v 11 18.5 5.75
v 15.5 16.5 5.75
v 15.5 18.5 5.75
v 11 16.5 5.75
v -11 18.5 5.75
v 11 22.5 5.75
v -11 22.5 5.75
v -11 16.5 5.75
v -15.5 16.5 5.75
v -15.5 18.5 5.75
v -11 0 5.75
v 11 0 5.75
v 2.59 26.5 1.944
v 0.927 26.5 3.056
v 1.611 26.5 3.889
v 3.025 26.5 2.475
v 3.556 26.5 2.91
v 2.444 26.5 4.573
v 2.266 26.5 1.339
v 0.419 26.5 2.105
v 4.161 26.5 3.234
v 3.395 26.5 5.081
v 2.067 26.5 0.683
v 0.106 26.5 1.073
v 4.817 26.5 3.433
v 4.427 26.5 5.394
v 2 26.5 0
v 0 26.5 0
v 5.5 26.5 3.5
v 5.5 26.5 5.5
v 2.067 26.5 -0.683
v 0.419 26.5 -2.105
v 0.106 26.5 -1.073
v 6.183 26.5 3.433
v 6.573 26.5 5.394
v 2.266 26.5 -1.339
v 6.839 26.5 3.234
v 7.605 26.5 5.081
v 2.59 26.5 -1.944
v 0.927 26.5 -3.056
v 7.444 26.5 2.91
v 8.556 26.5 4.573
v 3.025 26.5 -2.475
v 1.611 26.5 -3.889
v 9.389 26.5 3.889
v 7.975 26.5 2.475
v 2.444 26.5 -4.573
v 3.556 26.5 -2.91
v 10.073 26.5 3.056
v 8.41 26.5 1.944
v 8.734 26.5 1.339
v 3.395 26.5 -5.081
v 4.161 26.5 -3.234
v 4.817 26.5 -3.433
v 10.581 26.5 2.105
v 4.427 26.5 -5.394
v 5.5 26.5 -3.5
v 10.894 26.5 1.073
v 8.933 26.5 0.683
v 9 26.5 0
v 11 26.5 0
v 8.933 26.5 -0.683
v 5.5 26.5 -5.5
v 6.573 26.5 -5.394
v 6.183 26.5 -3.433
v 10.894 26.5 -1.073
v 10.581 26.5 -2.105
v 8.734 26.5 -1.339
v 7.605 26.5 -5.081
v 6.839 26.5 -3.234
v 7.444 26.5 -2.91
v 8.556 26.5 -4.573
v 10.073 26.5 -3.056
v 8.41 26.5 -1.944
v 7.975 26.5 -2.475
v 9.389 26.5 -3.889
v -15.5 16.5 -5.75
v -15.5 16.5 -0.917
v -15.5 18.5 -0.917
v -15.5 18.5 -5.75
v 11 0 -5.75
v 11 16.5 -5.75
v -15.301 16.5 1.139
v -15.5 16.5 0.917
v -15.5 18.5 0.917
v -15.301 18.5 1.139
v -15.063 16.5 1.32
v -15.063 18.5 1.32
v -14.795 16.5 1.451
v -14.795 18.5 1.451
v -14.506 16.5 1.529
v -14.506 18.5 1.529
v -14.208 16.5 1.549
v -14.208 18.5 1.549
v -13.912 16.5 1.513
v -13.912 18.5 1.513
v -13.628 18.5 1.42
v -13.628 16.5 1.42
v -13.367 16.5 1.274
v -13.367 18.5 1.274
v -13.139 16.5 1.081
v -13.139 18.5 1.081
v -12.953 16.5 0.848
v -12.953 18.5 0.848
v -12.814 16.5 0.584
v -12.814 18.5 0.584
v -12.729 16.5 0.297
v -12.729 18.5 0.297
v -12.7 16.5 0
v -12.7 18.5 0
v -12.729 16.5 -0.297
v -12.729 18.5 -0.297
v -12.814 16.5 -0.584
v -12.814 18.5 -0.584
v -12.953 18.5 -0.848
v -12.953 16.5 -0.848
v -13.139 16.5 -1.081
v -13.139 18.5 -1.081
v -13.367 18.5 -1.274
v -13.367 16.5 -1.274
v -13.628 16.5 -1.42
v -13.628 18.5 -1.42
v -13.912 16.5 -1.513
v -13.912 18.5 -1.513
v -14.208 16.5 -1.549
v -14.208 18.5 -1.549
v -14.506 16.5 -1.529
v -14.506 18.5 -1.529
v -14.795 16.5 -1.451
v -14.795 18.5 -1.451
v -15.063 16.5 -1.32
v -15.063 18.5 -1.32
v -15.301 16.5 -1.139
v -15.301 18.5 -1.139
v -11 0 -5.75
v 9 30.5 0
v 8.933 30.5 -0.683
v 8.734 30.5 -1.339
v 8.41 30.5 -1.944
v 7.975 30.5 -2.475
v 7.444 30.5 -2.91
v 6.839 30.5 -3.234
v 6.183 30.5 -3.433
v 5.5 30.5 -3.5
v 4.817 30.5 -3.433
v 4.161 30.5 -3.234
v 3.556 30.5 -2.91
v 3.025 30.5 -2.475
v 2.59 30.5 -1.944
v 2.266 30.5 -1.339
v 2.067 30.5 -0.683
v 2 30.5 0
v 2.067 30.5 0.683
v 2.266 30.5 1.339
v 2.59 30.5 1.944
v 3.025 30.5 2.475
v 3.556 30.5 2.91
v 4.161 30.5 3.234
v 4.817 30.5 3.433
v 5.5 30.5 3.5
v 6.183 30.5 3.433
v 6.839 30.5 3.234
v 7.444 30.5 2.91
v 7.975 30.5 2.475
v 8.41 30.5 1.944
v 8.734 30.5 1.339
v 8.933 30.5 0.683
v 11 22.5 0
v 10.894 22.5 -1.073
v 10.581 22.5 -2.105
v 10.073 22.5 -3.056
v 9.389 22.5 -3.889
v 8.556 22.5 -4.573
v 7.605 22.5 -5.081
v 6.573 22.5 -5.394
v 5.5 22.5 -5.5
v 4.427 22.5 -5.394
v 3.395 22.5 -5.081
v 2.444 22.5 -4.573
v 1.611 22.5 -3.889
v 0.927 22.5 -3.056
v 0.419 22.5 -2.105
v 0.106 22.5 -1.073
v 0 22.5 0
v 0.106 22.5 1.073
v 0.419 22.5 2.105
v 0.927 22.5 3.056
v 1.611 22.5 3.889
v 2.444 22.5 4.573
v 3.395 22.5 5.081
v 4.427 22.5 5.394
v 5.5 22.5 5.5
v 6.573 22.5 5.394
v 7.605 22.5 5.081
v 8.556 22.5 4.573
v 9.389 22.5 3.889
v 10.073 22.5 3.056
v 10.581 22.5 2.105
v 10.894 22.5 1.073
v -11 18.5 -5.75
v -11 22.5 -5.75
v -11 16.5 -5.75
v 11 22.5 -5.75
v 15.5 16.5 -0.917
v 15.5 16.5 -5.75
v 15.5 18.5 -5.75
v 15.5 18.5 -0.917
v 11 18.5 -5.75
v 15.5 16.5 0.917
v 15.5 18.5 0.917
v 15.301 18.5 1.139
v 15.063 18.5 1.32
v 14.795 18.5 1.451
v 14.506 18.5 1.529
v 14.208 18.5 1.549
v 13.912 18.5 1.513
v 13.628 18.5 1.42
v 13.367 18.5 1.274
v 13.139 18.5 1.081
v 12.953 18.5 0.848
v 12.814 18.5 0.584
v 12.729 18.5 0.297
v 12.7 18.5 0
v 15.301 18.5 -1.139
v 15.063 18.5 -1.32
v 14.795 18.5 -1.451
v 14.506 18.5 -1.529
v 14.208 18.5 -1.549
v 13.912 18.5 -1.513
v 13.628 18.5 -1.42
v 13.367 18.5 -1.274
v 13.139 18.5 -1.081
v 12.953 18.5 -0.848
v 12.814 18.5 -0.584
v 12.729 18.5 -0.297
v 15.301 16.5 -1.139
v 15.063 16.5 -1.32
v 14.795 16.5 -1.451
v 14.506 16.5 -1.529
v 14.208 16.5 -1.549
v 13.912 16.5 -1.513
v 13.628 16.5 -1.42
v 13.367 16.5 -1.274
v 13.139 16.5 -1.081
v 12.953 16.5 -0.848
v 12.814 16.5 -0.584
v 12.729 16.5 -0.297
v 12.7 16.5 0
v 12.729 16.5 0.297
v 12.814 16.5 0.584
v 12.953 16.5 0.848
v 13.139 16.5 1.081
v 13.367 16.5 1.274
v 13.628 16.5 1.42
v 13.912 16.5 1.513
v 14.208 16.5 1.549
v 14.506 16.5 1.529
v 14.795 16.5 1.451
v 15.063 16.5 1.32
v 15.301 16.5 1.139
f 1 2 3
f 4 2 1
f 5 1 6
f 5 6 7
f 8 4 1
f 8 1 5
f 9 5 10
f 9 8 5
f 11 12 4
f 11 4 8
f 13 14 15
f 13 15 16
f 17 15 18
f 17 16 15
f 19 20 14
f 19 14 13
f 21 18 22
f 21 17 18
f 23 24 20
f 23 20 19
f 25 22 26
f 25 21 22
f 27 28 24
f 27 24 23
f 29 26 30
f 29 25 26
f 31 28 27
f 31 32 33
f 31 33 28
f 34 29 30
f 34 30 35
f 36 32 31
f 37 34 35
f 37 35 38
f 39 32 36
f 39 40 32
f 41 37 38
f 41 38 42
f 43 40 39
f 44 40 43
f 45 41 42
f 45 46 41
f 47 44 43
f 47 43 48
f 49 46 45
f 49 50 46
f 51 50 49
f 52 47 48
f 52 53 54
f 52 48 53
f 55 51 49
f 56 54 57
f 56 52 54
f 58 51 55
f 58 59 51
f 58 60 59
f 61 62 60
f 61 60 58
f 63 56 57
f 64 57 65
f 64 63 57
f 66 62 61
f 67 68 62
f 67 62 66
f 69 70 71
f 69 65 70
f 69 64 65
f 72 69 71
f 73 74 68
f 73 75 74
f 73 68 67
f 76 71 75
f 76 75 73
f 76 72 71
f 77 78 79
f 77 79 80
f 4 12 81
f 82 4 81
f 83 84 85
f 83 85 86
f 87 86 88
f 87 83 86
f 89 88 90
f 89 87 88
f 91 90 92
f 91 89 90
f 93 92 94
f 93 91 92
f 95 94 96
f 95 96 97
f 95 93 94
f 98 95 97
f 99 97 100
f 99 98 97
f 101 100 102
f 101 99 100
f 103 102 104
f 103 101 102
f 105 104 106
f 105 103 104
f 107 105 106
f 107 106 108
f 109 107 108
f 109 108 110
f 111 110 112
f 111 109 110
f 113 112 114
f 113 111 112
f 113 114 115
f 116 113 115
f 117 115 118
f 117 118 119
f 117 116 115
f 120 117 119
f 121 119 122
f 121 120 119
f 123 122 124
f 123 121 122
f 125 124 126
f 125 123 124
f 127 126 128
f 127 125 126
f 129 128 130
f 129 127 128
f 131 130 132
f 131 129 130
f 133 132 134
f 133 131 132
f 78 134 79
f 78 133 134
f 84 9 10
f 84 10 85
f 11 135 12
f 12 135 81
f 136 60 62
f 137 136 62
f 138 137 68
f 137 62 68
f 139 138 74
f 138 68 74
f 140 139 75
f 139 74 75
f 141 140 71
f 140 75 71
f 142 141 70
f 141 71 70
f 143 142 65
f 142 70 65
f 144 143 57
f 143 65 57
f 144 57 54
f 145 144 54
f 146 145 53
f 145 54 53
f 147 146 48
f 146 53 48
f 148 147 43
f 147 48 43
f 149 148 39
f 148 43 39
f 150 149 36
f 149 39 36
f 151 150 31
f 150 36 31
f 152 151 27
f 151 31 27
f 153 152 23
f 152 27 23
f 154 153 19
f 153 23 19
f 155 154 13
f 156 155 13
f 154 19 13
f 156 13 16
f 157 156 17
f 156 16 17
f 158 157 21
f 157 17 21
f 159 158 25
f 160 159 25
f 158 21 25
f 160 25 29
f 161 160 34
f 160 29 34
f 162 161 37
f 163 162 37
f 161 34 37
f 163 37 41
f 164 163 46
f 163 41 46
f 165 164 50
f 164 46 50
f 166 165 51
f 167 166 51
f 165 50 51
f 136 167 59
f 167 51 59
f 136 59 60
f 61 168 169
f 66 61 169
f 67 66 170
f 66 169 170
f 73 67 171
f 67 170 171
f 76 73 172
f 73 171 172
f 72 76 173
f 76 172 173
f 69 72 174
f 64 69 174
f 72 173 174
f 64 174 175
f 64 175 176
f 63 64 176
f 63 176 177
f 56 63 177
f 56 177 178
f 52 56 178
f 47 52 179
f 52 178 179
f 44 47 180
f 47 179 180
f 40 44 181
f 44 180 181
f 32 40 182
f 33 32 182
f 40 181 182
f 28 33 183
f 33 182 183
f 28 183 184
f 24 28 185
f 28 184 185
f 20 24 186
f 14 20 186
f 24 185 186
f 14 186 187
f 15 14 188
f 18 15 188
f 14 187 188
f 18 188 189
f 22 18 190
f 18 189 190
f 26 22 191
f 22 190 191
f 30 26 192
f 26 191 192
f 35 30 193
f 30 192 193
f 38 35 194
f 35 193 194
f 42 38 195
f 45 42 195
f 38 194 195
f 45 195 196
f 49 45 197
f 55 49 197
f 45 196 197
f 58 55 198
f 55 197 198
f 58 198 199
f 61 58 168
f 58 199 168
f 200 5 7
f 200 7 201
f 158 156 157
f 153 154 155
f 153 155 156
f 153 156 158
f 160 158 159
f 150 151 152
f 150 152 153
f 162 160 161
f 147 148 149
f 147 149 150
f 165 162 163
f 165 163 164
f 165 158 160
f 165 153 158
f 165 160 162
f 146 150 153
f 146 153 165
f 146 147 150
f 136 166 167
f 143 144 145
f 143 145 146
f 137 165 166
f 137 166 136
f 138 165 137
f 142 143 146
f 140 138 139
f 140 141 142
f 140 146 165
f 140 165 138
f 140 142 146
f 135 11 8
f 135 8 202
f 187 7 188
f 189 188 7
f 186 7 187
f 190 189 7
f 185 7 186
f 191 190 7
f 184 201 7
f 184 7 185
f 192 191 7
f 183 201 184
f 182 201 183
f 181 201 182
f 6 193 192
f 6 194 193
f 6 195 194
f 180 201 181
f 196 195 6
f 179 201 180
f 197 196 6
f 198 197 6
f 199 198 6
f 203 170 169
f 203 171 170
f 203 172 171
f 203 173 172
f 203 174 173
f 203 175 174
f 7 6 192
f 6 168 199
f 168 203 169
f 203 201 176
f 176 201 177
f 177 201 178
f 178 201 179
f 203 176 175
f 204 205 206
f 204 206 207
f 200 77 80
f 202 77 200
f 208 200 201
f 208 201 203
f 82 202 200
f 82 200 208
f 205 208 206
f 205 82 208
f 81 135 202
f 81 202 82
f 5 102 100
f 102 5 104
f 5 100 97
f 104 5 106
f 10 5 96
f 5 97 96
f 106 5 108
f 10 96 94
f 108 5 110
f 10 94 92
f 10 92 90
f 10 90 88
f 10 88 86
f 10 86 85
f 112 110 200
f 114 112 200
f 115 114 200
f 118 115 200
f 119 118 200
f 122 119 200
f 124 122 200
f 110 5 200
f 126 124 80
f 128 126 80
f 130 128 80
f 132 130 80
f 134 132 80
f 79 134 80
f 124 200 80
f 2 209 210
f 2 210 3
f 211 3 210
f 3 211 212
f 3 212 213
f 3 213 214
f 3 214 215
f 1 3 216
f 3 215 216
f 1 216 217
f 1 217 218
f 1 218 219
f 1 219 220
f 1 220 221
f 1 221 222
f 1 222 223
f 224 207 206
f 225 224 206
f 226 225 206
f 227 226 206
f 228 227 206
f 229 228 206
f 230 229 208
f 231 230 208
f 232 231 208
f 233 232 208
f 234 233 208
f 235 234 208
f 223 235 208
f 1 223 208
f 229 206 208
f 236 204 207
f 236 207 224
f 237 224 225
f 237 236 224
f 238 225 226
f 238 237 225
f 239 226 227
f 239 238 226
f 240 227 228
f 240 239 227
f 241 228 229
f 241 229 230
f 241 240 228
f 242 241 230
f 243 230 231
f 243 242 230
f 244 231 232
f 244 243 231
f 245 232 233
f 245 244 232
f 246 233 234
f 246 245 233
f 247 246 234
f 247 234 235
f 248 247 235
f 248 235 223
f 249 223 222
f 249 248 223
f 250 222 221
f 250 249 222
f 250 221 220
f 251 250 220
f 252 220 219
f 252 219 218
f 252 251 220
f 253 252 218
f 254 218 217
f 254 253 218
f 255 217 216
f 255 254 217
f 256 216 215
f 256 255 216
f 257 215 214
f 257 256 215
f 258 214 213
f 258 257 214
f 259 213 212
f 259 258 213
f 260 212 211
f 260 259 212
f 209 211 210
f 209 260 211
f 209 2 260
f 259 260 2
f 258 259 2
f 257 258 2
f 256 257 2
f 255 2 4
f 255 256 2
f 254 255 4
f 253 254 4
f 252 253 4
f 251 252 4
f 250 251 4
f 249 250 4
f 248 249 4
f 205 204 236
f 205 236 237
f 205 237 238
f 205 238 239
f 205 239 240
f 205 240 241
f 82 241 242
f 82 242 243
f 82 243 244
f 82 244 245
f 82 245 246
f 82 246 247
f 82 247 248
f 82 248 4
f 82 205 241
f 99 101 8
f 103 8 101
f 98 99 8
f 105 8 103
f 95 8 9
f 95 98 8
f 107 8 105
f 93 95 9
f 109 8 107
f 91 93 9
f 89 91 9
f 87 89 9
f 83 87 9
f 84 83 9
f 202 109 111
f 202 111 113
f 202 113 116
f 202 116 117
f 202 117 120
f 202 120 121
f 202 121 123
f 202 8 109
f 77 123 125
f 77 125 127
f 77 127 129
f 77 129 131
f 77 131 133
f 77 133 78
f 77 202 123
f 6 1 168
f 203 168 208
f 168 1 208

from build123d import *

# Parameters (mm, degrees)
SKETCH1_W           = 22
SKETCH1_H           = 11.5
BOSS_EXTRUDE1_DEPTH = 16.5
BOSS_EXTRUDE2_DEPTH = 2
SKETCH4_W           = 22
SKETCH4_H           = 11.5
BOSS_EXTRUDE3_DEPTH = 4
SKETCH5_R           = 5.5
BOSS_EXTRUDE4_DEPTH = 4
SKETCH7_R           = 3.5
BOSS_EXTRUDE5_DEPTH = 4


with BuildPart() as part:
    # Sketch1 → Boss-Extrude1 (new body)
    with BuildSketch(Plane(origin=(0, 0, 0), x_dir=(1, 0, 0), z_dir=(0, 1, 0))):
        Rectangle(SKETCH1_W, SKETCH1_H)
    extrude(amount=BOSS_EXTRUDE1_DEPTH)

    # Sketch2 → Boss-Extrude2 (add)
    with BuildSketch(Plane(origin=(0, 16.5, 0), x_dir=(1, 0, 0), z_dir=(0, 1, 0))):
        with BuildLine():
            Line((-15.5, 5.75), (15.5, 5.75))
            Line((15.5, 5.75), (15.5, 0.916515139))
            ThreePointArc((15.5, 0.916515139), (12.7, 0), (15.5, -0.916515139))
            Line((15.5, -0.916515139), (15.5, -5.75))
            Line((15.5, -5.75), (-15.5, -5.75))
            Line((-15.5, -5.75), (-15.5, -0.916515139))
            ThreePointArc((-15.5, -0.916515139), (-12.7, 0), (-15.5, 0.916515139))
            Line((-15.5, 0.916515139), (-15.5, 5.75))
        make_face()
    extrude(amount=BOSS_EXTRUDE2_DEPTH)

    # Sketch4 → Boss-Extrude3 (add)
    with BuildSketch(Plane(origin=(0, 18.5, 0), x_dir=(1, 0, 0), z_dir=(0, 1, 0))):
        Rectangle(SKETCH4_W, SKETCH4_H)
    extrude(amount=BOSS_EXTRUDE3_DEPTH)

    # Sketch5 → Boss-Extrude4 (add)
    with BuildSketch(Plane(origin=(0, 22.5, 0), x_dir=(1, 0, 0), z_dir=(0, 1, 0))):
        with Locations((5.5, 0)):
            Circle(SKETCH5_R)
    extrude(amount=BOSS_EXTRUDE4_DEPTH)

    # Sketch7 → Boss-Extrude5 (add)
    with BuildSketch(Plane(origin=(0, 26.5, 0), x_dir=(1, 0, 0), z_dir=(0, 1, 0))):
        with Locations((5.5, 0)):
            Circle(SKETCH7_R)
    extrude(amount=BOSS_EXTRUDE5_DEPTH)


solid = part.part
